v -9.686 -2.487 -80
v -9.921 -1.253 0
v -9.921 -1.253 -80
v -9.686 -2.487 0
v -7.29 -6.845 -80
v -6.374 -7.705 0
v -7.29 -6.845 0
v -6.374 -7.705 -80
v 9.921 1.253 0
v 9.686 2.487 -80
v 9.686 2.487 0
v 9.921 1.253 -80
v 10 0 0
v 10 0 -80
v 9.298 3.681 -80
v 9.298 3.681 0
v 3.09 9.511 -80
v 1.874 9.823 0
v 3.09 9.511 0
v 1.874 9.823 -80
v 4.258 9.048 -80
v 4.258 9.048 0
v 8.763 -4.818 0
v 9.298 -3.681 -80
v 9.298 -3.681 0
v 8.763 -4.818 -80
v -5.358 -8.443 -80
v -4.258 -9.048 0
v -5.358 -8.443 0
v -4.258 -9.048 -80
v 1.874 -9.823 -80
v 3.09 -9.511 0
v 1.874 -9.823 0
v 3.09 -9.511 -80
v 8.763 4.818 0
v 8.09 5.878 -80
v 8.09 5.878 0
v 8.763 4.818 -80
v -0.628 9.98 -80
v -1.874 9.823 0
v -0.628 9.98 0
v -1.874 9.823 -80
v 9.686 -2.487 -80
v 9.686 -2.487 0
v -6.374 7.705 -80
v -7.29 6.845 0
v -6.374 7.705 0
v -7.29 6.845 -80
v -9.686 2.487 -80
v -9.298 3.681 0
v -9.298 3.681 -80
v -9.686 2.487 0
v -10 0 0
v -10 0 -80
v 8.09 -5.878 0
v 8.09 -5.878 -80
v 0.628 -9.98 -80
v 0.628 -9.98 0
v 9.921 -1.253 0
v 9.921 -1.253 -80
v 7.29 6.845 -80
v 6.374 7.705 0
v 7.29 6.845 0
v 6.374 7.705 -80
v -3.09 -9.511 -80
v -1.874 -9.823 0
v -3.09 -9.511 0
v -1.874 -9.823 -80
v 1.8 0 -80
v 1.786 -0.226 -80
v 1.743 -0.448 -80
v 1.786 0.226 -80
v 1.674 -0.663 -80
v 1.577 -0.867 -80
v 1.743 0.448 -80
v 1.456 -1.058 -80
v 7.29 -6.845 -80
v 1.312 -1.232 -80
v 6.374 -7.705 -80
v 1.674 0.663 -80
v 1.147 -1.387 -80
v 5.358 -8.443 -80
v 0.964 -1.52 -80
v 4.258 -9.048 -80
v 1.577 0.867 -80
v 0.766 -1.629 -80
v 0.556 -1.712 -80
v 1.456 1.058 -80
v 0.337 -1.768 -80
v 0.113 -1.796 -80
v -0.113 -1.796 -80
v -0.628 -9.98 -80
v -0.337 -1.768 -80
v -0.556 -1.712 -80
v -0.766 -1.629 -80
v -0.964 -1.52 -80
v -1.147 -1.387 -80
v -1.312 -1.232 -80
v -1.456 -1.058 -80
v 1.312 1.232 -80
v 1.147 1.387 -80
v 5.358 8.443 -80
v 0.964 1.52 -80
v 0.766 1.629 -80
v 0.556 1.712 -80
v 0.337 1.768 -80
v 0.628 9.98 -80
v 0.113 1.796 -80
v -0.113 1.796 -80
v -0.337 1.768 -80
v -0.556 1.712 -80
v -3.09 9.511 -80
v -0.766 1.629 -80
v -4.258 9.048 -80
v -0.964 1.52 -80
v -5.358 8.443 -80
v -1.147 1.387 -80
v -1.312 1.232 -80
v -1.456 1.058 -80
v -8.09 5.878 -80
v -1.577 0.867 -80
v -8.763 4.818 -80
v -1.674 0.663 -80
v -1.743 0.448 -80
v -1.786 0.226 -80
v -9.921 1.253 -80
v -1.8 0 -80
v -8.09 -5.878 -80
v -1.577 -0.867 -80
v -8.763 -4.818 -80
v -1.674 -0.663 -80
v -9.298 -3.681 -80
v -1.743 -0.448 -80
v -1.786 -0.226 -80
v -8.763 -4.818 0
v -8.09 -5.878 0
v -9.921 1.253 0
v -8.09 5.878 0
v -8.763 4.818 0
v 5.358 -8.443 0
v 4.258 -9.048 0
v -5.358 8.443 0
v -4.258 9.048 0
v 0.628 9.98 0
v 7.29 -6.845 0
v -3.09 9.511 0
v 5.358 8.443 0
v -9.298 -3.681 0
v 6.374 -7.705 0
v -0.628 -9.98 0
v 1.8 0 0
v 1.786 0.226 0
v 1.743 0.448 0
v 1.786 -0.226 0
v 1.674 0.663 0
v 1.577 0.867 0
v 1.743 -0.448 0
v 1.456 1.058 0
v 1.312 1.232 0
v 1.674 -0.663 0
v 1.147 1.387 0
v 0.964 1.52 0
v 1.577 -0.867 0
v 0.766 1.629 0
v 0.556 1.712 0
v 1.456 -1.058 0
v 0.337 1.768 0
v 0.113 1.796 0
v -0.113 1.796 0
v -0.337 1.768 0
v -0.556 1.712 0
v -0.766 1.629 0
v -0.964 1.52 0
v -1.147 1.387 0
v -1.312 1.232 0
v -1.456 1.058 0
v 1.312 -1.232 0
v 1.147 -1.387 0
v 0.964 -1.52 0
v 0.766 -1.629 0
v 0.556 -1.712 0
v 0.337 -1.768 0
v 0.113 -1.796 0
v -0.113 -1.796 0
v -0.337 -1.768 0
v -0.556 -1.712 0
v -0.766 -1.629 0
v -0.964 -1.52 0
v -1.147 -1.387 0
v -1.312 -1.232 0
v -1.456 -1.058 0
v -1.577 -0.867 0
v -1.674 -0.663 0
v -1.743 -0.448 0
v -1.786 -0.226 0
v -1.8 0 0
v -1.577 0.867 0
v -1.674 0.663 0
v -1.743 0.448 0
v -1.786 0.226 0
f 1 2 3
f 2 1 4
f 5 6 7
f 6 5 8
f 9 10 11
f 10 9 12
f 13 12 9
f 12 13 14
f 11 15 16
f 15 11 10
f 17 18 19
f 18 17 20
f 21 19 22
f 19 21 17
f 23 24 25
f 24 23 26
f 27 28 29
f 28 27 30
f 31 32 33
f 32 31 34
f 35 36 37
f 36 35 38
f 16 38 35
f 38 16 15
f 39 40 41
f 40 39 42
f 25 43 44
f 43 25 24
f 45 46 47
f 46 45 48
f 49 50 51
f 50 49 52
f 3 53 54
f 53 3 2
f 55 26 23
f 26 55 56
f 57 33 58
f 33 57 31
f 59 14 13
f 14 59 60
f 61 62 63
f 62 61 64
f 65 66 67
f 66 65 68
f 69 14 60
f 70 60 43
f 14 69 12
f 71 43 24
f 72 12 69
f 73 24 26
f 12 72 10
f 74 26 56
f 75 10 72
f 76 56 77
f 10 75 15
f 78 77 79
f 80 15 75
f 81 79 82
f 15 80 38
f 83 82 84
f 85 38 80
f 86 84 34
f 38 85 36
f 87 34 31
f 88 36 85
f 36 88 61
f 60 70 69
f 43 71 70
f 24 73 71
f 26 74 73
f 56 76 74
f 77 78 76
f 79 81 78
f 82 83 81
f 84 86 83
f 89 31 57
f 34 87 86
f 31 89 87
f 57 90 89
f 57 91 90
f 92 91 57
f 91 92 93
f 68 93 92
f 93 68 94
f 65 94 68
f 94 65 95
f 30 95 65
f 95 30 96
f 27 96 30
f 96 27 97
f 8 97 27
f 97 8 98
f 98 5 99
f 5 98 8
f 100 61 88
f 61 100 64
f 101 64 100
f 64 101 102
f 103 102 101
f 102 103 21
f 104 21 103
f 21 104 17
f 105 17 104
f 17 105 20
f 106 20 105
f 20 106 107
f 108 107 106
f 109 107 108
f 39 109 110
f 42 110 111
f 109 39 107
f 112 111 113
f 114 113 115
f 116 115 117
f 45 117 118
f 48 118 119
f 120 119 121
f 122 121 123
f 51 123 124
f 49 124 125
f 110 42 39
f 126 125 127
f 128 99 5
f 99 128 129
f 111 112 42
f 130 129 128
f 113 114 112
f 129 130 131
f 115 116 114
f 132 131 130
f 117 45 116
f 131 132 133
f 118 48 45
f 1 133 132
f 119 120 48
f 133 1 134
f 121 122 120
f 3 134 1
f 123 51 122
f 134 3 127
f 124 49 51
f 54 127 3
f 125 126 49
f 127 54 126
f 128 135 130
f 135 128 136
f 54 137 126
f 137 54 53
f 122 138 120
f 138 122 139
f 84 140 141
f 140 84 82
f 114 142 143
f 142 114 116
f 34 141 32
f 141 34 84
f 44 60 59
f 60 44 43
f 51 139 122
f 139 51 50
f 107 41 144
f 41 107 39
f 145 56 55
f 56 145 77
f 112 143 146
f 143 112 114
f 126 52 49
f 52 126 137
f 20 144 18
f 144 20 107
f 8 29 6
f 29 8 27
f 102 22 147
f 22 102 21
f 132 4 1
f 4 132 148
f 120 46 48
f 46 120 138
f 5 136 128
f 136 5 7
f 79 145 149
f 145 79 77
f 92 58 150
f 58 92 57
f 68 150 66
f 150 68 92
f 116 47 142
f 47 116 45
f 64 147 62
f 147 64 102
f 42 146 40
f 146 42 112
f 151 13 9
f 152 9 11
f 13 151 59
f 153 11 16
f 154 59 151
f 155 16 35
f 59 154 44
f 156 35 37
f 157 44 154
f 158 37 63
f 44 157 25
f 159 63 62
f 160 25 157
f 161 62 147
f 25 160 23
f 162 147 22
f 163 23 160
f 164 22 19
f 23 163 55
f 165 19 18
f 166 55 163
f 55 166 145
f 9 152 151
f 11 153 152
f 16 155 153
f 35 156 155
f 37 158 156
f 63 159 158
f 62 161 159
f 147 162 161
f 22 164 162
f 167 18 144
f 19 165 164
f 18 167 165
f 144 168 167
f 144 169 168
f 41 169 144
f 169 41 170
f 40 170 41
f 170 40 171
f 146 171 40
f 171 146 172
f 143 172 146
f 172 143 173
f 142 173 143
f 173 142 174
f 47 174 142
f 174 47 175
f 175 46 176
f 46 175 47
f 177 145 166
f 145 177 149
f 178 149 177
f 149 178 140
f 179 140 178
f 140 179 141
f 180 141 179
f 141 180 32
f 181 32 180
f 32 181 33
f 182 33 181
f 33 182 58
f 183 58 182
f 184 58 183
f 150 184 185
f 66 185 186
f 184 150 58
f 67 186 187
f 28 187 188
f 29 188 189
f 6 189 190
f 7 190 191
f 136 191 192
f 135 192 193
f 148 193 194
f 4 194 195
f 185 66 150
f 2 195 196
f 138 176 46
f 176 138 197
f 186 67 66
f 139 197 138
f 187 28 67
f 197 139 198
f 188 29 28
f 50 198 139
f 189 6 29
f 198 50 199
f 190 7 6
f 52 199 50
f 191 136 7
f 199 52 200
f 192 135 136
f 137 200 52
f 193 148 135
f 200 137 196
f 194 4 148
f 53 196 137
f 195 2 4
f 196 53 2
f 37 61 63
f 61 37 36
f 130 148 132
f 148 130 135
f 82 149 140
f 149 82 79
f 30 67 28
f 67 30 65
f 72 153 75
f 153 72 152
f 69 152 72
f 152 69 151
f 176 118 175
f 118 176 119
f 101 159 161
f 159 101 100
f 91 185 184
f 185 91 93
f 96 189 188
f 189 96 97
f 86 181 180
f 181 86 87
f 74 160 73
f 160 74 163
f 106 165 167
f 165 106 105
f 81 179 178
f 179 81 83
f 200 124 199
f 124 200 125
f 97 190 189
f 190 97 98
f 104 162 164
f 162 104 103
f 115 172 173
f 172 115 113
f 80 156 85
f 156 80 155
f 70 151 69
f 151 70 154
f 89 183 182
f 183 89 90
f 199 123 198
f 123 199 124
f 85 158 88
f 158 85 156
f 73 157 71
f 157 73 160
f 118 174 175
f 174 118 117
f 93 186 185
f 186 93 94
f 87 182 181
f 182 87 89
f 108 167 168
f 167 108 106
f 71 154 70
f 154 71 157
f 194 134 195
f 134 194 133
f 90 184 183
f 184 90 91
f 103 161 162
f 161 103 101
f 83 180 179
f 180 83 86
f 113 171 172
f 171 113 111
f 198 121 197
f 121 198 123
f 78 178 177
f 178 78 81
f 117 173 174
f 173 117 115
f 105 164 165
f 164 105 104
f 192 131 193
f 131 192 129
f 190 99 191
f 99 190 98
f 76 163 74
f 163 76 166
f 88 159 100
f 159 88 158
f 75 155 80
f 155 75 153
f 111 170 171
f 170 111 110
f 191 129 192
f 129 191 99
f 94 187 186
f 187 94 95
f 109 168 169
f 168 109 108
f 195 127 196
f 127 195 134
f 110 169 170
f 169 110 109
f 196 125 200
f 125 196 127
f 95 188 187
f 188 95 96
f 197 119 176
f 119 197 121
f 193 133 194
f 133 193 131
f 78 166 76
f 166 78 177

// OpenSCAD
$fn = 50;


difference() {
	union() {
		translate(v = [0, 0, -80.0000000000]) {
			cylinder(h = 80, r = 10.0000000000);
		}
		cylinder(h = 0, r = 20.0000000000);
	}
	union() {
		#translate(v = [0, 0, -80]) {
			cylinder(h = 80, r = 1.8000000000);
		}
	}
}
